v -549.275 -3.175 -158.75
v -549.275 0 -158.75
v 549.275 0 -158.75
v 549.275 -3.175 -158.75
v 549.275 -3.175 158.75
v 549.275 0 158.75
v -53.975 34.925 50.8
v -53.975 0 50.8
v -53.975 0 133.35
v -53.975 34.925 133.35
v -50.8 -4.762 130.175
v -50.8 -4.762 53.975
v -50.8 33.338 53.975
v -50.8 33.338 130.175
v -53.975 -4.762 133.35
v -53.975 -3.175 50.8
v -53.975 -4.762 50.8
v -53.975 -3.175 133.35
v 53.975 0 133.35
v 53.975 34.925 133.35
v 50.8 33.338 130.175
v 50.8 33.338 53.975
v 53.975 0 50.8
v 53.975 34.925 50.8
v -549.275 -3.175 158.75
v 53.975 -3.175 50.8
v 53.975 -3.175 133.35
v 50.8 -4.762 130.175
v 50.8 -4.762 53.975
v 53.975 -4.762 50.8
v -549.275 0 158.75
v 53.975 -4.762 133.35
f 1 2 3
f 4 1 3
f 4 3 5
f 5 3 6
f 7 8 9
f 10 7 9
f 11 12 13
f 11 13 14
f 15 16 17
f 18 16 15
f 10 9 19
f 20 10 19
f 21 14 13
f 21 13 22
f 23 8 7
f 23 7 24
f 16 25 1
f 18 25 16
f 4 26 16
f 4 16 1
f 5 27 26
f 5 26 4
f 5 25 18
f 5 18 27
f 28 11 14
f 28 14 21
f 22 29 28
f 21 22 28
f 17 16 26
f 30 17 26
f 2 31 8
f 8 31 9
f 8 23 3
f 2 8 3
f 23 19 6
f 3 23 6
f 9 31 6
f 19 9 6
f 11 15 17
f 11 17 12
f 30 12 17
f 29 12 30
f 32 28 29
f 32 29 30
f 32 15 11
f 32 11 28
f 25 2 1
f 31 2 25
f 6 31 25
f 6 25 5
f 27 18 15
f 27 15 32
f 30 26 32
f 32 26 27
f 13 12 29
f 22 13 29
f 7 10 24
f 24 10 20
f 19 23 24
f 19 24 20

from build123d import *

# Parameters (mm, degrees)
F0_W     = 1098.55
F0_H     = 317.5
F1_DEPTH = 3.175
F2_W     = 107.95
F2_H     = 82.55
F3_DEPTH = 38.1
F4_DEPTH = 1.5875
F5_W     = 101.6
F5_H     = 76.2
F6_DEPTH = 38.1


with BuildPart() as f1:
    # F0 (on Front) → F1 (new body)
    with BuildSketch(Plane.XZ):
        Rectangle(F0_W, F0_H)
    extrude(amount=F1_DEPTH)

    # F2 (on face) → F3 (join)
    with BuildSketch(Plane.XZ.offset(3.175)):
        with Locations((0, 92.075)):
            Rectangle(F2_W, F2_H)
    extrude(amount=-F3_DEPTH)

    # F2 (on face) → F4 (join)
    with BuildSketch(Plane.XZ.offset(3.175)):
        with Locations((0, 92.075)):
            Rectangle(F2_W, F2_H)
    extrude(amount=F4_DEPTH)

    # F5 (on face) → F6 (cut)
    with BuildSketch(Plane.XZ.offset(4.7625)):
        with Locations((0, 92.075)):
            Rectangle(F5_W, F5_H)
    extrude(amount=-F6_DEPTH, mode=Mode.SUBTRACT)


solid = f1.part
